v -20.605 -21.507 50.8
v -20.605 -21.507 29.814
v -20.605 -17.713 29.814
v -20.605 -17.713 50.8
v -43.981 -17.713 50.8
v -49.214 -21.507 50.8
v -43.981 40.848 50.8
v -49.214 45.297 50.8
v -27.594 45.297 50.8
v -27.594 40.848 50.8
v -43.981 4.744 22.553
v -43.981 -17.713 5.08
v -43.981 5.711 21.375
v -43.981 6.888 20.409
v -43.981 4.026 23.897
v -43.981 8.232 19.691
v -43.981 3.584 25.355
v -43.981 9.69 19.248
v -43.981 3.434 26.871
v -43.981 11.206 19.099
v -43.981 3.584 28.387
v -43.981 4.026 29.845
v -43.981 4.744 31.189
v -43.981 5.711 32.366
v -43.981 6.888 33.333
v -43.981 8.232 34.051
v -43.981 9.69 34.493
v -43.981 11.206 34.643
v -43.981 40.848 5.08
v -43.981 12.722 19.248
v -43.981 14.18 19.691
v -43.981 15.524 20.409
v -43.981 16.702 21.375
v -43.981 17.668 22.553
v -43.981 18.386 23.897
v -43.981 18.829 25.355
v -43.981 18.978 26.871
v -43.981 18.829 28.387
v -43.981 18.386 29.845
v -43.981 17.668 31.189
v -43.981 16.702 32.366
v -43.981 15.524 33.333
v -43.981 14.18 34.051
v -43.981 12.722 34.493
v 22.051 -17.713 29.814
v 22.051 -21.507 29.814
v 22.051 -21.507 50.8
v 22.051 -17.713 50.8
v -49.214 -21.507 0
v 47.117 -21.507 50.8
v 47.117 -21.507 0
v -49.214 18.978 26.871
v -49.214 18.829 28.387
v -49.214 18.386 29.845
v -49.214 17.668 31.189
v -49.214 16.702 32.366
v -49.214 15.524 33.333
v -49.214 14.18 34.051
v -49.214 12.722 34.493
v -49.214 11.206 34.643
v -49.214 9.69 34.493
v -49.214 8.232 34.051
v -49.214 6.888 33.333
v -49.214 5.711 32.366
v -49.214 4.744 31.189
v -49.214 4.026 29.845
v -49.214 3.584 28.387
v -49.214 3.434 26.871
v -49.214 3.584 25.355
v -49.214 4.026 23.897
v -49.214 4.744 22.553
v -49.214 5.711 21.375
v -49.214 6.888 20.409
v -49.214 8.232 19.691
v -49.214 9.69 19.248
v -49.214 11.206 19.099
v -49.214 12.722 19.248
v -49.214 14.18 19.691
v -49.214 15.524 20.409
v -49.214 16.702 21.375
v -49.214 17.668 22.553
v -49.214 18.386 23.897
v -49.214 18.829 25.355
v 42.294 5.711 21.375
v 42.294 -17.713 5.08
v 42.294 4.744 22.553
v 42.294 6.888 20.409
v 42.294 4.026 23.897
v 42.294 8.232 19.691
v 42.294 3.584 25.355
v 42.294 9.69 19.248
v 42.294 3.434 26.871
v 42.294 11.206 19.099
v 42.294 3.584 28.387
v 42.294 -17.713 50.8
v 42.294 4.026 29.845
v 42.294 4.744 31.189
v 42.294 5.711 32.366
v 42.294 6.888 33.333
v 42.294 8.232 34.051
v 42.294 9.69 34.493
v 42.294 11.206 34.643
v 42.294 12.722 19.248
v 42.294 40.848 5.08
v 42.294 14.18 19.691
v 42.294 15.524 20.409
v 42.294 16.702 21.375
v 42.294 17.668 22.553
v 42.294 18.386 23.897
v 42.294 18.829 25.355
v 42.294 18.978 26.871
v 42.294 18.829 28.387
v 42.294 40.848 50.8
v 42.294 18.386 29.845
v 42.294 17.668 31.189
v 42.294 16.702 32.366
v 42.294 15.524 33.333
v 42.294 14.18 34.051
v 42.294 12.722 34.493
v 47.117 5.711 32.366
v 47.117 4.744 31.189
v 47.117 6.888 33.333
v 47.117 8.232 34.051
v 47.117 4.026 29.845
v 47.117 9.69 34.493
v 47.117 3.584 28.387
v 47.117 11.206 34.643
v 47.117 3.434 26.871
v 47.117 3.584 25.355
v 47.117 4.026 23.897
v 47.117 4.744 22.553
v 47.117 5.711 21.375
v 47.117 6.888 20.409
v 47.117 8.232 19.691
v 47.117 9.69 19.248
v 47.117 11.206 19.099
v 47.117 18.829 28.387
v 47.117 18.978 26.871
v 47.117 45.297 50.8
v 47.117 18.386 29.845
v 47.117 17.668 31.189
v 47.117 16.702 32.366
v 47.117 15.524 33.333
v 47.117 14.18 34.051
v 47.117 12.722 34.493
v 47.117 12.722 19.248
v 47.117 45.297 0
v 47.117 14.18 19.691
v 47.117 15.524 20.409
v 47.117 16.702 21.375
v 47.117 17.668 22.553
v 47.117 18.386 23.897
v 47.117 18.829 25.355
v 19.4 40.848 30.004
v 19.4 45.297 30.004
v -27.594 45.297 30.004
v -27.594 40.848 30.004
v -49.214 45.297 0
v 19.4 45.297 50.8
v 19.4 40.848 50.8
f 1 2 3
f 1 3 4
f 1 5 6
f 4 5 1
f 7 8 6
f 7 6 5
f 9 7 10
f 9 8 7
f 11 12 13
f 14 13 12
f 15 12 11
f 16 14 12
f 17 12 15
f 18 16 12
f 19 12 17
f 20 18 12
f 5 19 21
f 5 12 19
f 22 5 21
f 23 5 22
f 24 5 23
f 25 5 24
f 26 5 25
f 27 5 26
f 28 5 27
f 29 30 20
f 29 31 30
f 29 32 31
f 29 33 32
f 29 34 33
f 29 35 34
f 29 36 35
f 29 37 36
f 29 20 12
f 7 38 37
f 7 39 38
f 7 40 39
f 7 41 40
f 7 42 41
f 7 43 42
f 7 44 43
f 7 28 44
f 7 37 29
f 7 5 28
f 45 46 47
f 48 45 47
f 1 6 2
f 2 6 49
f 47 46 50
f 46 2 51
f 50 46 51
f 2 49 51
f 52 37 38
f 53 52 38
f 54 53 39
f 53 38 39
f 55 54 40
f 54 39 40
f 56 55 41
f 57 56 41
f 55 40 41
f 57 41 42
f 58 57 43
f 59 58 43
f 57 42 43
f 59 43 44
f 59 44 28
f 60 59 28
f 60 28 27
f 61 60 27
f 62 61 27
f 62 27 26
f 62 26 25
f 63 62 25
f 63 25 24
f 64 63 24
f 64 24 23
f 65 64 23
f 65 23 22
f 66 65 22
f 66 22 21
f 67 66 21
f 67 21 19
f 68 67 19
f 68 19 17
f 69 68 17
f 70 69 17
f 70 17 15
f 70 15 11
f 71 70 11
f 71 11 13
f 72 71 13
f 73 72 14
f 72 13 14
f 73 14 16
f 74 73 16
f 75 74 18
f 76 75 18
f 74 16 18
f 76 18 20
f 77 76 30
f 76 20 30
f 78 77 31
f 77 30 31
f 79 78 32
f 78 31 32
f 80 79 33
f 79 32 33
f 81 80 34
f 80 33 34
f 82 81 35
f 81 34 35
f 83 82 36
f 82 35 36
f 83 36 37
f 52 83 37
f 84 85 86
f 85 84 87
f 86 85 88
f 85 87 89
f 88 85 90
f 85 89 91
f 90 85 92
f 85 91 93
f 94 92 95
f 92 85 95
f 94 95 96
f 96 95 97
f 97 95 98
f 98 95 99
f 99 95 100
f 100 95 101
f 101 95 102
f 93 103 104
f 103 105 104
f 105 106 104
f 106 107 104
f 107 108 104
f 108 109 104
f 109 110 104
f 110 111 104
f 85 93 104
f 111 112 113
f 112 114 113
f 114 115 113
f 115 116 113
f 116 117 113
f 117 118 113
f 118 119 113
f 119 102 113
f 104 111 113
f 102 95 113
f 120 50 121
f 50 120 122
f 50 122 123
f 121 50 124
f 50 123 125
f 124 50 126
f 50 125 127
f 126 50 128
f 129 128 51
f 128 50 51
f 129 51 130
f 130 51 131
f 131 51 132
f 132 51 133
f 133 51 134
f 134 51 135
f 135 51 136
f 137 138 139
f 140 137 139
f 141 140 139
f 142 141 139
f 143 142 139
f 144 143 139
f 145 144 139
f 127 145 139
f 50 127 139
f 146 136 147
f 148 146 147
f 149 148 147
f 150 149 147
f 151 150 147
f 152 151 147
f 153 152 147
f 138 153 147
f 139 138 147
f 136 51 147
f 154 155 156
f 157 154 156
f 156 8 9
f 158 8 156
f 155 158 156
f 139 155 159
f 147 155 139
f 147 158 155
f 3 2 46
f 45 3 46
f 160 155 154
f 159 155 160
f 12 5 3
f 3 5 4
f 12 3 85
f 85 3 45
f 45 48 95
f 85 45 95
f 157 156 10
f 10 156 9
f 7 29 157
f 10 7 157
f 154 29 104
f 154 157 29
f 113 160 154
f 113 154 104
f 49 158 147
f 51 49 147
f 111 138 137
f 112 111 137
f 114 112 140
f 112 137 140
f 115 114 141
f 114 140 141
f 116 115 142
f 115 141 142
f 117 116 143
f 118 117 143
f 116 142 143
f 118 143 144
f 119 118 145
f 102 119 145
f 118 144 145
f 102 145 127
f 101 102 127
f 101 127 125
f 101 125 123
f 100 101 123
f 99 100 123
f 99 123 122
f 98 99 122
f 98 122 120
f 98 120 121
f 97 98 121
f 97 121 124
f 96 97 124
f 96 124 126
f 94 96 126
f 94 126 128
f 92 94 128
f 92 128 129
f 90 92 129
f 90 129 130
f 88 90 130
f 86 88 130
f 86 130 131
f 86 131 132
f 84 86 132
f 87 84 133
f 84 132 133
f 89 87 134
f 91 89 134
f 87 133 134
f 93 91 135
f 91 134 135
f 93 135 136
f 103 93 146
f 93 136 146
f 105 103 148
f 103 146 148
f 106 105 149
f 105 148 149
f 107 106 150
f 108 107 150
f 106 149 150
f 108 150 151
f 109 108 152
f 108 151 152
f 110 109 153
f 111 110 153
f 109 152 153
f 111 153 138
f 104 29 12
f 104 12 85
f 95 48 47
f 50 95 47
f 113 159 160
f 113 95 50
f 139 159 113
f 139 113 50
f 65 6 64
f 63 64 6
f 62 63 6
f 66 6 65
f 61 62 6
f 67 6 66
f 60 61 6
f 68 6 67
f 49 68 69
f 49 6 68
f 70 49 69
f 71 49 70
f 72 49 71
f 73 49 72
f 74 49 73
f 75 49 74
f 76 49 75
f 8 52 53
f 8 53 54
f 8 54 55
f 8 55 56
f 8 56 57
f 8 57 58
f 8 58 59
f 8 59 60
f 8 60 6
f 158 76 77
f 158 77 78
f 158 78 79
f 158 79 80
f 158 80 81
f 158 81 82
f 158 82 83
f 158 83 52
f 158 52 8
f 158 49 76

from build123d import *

# Parameters (mm, degrees)
F0_W     = 96.331384033
F0_H     = 66.804073751
F1_DEPTH = 50.8
F2_W     = 86.2758494914
F2_H     = 58.5615355521
F3_DEPTH = 45.72
F4_W     = 42.655935511
F4_H     = 20.9858628541
F5_DEPTH = 25.4
F6_W     = 46.9938255847
F6_H     = 20.7962493032
F7_DEPTH = 25.4
F8_R     = 7.7718220909
F9_DEPTH = 127


with BuildPart() as f1:
    # F0 (on Top) → F1 (new body)
    with BuildSketch(Plane.XY):
        with Locations((-1.048495993, 11.8953883648)):
            Rectangle(F0_W, F0_H)
    extrude(amount=F1_DEPTH)

    # F2 (on face) → F3 (cut)
    with BuildSketch(Plane.XY.offset(50.8)):
        with Locations((-0.8434783667, 11.5677108988)):
            Rectangle(F2_W, F2_H)
    extrude(amount=-F3_DEPTH, mode=Mode.SUBTRACT)

    # F4 (on face) → F5 (cut)
    with BuildSketch(Plane.XZ.offset(21.5066485107)):
        with Locations((0.7229829207, 40.3070685729)):
            Rectangle(F4_W, F4_H)
    extrude(amount=-F5_DEPTH, mode=Mode.SUBTRACT)

    # F6 (on face) → F7 (cut)
    with BuildSketch(Plane(origin=(0, 45.2974252403, 0), x_dir=(-1, 0, 0), z_dir=(0, 1, 0))):
        with Locations((4.096897319, 40.4018753484)):
            Rectangle(F6_W, F6_H)
    extrude(amount=-F7_DEPTH, mode=Mode.SUBTRACT)

    # F8 (on face) → F9 (cut)
    with BuildSketch(Plane.YZ.offset(47.1171960235)):
        with Locations((11.2062208354, 26.8708299845)):
            Circle(F8_R)
    extrude(amount=-F9_DEPTH, mode=Mode.SUBTRACT)


solid = f1.part
